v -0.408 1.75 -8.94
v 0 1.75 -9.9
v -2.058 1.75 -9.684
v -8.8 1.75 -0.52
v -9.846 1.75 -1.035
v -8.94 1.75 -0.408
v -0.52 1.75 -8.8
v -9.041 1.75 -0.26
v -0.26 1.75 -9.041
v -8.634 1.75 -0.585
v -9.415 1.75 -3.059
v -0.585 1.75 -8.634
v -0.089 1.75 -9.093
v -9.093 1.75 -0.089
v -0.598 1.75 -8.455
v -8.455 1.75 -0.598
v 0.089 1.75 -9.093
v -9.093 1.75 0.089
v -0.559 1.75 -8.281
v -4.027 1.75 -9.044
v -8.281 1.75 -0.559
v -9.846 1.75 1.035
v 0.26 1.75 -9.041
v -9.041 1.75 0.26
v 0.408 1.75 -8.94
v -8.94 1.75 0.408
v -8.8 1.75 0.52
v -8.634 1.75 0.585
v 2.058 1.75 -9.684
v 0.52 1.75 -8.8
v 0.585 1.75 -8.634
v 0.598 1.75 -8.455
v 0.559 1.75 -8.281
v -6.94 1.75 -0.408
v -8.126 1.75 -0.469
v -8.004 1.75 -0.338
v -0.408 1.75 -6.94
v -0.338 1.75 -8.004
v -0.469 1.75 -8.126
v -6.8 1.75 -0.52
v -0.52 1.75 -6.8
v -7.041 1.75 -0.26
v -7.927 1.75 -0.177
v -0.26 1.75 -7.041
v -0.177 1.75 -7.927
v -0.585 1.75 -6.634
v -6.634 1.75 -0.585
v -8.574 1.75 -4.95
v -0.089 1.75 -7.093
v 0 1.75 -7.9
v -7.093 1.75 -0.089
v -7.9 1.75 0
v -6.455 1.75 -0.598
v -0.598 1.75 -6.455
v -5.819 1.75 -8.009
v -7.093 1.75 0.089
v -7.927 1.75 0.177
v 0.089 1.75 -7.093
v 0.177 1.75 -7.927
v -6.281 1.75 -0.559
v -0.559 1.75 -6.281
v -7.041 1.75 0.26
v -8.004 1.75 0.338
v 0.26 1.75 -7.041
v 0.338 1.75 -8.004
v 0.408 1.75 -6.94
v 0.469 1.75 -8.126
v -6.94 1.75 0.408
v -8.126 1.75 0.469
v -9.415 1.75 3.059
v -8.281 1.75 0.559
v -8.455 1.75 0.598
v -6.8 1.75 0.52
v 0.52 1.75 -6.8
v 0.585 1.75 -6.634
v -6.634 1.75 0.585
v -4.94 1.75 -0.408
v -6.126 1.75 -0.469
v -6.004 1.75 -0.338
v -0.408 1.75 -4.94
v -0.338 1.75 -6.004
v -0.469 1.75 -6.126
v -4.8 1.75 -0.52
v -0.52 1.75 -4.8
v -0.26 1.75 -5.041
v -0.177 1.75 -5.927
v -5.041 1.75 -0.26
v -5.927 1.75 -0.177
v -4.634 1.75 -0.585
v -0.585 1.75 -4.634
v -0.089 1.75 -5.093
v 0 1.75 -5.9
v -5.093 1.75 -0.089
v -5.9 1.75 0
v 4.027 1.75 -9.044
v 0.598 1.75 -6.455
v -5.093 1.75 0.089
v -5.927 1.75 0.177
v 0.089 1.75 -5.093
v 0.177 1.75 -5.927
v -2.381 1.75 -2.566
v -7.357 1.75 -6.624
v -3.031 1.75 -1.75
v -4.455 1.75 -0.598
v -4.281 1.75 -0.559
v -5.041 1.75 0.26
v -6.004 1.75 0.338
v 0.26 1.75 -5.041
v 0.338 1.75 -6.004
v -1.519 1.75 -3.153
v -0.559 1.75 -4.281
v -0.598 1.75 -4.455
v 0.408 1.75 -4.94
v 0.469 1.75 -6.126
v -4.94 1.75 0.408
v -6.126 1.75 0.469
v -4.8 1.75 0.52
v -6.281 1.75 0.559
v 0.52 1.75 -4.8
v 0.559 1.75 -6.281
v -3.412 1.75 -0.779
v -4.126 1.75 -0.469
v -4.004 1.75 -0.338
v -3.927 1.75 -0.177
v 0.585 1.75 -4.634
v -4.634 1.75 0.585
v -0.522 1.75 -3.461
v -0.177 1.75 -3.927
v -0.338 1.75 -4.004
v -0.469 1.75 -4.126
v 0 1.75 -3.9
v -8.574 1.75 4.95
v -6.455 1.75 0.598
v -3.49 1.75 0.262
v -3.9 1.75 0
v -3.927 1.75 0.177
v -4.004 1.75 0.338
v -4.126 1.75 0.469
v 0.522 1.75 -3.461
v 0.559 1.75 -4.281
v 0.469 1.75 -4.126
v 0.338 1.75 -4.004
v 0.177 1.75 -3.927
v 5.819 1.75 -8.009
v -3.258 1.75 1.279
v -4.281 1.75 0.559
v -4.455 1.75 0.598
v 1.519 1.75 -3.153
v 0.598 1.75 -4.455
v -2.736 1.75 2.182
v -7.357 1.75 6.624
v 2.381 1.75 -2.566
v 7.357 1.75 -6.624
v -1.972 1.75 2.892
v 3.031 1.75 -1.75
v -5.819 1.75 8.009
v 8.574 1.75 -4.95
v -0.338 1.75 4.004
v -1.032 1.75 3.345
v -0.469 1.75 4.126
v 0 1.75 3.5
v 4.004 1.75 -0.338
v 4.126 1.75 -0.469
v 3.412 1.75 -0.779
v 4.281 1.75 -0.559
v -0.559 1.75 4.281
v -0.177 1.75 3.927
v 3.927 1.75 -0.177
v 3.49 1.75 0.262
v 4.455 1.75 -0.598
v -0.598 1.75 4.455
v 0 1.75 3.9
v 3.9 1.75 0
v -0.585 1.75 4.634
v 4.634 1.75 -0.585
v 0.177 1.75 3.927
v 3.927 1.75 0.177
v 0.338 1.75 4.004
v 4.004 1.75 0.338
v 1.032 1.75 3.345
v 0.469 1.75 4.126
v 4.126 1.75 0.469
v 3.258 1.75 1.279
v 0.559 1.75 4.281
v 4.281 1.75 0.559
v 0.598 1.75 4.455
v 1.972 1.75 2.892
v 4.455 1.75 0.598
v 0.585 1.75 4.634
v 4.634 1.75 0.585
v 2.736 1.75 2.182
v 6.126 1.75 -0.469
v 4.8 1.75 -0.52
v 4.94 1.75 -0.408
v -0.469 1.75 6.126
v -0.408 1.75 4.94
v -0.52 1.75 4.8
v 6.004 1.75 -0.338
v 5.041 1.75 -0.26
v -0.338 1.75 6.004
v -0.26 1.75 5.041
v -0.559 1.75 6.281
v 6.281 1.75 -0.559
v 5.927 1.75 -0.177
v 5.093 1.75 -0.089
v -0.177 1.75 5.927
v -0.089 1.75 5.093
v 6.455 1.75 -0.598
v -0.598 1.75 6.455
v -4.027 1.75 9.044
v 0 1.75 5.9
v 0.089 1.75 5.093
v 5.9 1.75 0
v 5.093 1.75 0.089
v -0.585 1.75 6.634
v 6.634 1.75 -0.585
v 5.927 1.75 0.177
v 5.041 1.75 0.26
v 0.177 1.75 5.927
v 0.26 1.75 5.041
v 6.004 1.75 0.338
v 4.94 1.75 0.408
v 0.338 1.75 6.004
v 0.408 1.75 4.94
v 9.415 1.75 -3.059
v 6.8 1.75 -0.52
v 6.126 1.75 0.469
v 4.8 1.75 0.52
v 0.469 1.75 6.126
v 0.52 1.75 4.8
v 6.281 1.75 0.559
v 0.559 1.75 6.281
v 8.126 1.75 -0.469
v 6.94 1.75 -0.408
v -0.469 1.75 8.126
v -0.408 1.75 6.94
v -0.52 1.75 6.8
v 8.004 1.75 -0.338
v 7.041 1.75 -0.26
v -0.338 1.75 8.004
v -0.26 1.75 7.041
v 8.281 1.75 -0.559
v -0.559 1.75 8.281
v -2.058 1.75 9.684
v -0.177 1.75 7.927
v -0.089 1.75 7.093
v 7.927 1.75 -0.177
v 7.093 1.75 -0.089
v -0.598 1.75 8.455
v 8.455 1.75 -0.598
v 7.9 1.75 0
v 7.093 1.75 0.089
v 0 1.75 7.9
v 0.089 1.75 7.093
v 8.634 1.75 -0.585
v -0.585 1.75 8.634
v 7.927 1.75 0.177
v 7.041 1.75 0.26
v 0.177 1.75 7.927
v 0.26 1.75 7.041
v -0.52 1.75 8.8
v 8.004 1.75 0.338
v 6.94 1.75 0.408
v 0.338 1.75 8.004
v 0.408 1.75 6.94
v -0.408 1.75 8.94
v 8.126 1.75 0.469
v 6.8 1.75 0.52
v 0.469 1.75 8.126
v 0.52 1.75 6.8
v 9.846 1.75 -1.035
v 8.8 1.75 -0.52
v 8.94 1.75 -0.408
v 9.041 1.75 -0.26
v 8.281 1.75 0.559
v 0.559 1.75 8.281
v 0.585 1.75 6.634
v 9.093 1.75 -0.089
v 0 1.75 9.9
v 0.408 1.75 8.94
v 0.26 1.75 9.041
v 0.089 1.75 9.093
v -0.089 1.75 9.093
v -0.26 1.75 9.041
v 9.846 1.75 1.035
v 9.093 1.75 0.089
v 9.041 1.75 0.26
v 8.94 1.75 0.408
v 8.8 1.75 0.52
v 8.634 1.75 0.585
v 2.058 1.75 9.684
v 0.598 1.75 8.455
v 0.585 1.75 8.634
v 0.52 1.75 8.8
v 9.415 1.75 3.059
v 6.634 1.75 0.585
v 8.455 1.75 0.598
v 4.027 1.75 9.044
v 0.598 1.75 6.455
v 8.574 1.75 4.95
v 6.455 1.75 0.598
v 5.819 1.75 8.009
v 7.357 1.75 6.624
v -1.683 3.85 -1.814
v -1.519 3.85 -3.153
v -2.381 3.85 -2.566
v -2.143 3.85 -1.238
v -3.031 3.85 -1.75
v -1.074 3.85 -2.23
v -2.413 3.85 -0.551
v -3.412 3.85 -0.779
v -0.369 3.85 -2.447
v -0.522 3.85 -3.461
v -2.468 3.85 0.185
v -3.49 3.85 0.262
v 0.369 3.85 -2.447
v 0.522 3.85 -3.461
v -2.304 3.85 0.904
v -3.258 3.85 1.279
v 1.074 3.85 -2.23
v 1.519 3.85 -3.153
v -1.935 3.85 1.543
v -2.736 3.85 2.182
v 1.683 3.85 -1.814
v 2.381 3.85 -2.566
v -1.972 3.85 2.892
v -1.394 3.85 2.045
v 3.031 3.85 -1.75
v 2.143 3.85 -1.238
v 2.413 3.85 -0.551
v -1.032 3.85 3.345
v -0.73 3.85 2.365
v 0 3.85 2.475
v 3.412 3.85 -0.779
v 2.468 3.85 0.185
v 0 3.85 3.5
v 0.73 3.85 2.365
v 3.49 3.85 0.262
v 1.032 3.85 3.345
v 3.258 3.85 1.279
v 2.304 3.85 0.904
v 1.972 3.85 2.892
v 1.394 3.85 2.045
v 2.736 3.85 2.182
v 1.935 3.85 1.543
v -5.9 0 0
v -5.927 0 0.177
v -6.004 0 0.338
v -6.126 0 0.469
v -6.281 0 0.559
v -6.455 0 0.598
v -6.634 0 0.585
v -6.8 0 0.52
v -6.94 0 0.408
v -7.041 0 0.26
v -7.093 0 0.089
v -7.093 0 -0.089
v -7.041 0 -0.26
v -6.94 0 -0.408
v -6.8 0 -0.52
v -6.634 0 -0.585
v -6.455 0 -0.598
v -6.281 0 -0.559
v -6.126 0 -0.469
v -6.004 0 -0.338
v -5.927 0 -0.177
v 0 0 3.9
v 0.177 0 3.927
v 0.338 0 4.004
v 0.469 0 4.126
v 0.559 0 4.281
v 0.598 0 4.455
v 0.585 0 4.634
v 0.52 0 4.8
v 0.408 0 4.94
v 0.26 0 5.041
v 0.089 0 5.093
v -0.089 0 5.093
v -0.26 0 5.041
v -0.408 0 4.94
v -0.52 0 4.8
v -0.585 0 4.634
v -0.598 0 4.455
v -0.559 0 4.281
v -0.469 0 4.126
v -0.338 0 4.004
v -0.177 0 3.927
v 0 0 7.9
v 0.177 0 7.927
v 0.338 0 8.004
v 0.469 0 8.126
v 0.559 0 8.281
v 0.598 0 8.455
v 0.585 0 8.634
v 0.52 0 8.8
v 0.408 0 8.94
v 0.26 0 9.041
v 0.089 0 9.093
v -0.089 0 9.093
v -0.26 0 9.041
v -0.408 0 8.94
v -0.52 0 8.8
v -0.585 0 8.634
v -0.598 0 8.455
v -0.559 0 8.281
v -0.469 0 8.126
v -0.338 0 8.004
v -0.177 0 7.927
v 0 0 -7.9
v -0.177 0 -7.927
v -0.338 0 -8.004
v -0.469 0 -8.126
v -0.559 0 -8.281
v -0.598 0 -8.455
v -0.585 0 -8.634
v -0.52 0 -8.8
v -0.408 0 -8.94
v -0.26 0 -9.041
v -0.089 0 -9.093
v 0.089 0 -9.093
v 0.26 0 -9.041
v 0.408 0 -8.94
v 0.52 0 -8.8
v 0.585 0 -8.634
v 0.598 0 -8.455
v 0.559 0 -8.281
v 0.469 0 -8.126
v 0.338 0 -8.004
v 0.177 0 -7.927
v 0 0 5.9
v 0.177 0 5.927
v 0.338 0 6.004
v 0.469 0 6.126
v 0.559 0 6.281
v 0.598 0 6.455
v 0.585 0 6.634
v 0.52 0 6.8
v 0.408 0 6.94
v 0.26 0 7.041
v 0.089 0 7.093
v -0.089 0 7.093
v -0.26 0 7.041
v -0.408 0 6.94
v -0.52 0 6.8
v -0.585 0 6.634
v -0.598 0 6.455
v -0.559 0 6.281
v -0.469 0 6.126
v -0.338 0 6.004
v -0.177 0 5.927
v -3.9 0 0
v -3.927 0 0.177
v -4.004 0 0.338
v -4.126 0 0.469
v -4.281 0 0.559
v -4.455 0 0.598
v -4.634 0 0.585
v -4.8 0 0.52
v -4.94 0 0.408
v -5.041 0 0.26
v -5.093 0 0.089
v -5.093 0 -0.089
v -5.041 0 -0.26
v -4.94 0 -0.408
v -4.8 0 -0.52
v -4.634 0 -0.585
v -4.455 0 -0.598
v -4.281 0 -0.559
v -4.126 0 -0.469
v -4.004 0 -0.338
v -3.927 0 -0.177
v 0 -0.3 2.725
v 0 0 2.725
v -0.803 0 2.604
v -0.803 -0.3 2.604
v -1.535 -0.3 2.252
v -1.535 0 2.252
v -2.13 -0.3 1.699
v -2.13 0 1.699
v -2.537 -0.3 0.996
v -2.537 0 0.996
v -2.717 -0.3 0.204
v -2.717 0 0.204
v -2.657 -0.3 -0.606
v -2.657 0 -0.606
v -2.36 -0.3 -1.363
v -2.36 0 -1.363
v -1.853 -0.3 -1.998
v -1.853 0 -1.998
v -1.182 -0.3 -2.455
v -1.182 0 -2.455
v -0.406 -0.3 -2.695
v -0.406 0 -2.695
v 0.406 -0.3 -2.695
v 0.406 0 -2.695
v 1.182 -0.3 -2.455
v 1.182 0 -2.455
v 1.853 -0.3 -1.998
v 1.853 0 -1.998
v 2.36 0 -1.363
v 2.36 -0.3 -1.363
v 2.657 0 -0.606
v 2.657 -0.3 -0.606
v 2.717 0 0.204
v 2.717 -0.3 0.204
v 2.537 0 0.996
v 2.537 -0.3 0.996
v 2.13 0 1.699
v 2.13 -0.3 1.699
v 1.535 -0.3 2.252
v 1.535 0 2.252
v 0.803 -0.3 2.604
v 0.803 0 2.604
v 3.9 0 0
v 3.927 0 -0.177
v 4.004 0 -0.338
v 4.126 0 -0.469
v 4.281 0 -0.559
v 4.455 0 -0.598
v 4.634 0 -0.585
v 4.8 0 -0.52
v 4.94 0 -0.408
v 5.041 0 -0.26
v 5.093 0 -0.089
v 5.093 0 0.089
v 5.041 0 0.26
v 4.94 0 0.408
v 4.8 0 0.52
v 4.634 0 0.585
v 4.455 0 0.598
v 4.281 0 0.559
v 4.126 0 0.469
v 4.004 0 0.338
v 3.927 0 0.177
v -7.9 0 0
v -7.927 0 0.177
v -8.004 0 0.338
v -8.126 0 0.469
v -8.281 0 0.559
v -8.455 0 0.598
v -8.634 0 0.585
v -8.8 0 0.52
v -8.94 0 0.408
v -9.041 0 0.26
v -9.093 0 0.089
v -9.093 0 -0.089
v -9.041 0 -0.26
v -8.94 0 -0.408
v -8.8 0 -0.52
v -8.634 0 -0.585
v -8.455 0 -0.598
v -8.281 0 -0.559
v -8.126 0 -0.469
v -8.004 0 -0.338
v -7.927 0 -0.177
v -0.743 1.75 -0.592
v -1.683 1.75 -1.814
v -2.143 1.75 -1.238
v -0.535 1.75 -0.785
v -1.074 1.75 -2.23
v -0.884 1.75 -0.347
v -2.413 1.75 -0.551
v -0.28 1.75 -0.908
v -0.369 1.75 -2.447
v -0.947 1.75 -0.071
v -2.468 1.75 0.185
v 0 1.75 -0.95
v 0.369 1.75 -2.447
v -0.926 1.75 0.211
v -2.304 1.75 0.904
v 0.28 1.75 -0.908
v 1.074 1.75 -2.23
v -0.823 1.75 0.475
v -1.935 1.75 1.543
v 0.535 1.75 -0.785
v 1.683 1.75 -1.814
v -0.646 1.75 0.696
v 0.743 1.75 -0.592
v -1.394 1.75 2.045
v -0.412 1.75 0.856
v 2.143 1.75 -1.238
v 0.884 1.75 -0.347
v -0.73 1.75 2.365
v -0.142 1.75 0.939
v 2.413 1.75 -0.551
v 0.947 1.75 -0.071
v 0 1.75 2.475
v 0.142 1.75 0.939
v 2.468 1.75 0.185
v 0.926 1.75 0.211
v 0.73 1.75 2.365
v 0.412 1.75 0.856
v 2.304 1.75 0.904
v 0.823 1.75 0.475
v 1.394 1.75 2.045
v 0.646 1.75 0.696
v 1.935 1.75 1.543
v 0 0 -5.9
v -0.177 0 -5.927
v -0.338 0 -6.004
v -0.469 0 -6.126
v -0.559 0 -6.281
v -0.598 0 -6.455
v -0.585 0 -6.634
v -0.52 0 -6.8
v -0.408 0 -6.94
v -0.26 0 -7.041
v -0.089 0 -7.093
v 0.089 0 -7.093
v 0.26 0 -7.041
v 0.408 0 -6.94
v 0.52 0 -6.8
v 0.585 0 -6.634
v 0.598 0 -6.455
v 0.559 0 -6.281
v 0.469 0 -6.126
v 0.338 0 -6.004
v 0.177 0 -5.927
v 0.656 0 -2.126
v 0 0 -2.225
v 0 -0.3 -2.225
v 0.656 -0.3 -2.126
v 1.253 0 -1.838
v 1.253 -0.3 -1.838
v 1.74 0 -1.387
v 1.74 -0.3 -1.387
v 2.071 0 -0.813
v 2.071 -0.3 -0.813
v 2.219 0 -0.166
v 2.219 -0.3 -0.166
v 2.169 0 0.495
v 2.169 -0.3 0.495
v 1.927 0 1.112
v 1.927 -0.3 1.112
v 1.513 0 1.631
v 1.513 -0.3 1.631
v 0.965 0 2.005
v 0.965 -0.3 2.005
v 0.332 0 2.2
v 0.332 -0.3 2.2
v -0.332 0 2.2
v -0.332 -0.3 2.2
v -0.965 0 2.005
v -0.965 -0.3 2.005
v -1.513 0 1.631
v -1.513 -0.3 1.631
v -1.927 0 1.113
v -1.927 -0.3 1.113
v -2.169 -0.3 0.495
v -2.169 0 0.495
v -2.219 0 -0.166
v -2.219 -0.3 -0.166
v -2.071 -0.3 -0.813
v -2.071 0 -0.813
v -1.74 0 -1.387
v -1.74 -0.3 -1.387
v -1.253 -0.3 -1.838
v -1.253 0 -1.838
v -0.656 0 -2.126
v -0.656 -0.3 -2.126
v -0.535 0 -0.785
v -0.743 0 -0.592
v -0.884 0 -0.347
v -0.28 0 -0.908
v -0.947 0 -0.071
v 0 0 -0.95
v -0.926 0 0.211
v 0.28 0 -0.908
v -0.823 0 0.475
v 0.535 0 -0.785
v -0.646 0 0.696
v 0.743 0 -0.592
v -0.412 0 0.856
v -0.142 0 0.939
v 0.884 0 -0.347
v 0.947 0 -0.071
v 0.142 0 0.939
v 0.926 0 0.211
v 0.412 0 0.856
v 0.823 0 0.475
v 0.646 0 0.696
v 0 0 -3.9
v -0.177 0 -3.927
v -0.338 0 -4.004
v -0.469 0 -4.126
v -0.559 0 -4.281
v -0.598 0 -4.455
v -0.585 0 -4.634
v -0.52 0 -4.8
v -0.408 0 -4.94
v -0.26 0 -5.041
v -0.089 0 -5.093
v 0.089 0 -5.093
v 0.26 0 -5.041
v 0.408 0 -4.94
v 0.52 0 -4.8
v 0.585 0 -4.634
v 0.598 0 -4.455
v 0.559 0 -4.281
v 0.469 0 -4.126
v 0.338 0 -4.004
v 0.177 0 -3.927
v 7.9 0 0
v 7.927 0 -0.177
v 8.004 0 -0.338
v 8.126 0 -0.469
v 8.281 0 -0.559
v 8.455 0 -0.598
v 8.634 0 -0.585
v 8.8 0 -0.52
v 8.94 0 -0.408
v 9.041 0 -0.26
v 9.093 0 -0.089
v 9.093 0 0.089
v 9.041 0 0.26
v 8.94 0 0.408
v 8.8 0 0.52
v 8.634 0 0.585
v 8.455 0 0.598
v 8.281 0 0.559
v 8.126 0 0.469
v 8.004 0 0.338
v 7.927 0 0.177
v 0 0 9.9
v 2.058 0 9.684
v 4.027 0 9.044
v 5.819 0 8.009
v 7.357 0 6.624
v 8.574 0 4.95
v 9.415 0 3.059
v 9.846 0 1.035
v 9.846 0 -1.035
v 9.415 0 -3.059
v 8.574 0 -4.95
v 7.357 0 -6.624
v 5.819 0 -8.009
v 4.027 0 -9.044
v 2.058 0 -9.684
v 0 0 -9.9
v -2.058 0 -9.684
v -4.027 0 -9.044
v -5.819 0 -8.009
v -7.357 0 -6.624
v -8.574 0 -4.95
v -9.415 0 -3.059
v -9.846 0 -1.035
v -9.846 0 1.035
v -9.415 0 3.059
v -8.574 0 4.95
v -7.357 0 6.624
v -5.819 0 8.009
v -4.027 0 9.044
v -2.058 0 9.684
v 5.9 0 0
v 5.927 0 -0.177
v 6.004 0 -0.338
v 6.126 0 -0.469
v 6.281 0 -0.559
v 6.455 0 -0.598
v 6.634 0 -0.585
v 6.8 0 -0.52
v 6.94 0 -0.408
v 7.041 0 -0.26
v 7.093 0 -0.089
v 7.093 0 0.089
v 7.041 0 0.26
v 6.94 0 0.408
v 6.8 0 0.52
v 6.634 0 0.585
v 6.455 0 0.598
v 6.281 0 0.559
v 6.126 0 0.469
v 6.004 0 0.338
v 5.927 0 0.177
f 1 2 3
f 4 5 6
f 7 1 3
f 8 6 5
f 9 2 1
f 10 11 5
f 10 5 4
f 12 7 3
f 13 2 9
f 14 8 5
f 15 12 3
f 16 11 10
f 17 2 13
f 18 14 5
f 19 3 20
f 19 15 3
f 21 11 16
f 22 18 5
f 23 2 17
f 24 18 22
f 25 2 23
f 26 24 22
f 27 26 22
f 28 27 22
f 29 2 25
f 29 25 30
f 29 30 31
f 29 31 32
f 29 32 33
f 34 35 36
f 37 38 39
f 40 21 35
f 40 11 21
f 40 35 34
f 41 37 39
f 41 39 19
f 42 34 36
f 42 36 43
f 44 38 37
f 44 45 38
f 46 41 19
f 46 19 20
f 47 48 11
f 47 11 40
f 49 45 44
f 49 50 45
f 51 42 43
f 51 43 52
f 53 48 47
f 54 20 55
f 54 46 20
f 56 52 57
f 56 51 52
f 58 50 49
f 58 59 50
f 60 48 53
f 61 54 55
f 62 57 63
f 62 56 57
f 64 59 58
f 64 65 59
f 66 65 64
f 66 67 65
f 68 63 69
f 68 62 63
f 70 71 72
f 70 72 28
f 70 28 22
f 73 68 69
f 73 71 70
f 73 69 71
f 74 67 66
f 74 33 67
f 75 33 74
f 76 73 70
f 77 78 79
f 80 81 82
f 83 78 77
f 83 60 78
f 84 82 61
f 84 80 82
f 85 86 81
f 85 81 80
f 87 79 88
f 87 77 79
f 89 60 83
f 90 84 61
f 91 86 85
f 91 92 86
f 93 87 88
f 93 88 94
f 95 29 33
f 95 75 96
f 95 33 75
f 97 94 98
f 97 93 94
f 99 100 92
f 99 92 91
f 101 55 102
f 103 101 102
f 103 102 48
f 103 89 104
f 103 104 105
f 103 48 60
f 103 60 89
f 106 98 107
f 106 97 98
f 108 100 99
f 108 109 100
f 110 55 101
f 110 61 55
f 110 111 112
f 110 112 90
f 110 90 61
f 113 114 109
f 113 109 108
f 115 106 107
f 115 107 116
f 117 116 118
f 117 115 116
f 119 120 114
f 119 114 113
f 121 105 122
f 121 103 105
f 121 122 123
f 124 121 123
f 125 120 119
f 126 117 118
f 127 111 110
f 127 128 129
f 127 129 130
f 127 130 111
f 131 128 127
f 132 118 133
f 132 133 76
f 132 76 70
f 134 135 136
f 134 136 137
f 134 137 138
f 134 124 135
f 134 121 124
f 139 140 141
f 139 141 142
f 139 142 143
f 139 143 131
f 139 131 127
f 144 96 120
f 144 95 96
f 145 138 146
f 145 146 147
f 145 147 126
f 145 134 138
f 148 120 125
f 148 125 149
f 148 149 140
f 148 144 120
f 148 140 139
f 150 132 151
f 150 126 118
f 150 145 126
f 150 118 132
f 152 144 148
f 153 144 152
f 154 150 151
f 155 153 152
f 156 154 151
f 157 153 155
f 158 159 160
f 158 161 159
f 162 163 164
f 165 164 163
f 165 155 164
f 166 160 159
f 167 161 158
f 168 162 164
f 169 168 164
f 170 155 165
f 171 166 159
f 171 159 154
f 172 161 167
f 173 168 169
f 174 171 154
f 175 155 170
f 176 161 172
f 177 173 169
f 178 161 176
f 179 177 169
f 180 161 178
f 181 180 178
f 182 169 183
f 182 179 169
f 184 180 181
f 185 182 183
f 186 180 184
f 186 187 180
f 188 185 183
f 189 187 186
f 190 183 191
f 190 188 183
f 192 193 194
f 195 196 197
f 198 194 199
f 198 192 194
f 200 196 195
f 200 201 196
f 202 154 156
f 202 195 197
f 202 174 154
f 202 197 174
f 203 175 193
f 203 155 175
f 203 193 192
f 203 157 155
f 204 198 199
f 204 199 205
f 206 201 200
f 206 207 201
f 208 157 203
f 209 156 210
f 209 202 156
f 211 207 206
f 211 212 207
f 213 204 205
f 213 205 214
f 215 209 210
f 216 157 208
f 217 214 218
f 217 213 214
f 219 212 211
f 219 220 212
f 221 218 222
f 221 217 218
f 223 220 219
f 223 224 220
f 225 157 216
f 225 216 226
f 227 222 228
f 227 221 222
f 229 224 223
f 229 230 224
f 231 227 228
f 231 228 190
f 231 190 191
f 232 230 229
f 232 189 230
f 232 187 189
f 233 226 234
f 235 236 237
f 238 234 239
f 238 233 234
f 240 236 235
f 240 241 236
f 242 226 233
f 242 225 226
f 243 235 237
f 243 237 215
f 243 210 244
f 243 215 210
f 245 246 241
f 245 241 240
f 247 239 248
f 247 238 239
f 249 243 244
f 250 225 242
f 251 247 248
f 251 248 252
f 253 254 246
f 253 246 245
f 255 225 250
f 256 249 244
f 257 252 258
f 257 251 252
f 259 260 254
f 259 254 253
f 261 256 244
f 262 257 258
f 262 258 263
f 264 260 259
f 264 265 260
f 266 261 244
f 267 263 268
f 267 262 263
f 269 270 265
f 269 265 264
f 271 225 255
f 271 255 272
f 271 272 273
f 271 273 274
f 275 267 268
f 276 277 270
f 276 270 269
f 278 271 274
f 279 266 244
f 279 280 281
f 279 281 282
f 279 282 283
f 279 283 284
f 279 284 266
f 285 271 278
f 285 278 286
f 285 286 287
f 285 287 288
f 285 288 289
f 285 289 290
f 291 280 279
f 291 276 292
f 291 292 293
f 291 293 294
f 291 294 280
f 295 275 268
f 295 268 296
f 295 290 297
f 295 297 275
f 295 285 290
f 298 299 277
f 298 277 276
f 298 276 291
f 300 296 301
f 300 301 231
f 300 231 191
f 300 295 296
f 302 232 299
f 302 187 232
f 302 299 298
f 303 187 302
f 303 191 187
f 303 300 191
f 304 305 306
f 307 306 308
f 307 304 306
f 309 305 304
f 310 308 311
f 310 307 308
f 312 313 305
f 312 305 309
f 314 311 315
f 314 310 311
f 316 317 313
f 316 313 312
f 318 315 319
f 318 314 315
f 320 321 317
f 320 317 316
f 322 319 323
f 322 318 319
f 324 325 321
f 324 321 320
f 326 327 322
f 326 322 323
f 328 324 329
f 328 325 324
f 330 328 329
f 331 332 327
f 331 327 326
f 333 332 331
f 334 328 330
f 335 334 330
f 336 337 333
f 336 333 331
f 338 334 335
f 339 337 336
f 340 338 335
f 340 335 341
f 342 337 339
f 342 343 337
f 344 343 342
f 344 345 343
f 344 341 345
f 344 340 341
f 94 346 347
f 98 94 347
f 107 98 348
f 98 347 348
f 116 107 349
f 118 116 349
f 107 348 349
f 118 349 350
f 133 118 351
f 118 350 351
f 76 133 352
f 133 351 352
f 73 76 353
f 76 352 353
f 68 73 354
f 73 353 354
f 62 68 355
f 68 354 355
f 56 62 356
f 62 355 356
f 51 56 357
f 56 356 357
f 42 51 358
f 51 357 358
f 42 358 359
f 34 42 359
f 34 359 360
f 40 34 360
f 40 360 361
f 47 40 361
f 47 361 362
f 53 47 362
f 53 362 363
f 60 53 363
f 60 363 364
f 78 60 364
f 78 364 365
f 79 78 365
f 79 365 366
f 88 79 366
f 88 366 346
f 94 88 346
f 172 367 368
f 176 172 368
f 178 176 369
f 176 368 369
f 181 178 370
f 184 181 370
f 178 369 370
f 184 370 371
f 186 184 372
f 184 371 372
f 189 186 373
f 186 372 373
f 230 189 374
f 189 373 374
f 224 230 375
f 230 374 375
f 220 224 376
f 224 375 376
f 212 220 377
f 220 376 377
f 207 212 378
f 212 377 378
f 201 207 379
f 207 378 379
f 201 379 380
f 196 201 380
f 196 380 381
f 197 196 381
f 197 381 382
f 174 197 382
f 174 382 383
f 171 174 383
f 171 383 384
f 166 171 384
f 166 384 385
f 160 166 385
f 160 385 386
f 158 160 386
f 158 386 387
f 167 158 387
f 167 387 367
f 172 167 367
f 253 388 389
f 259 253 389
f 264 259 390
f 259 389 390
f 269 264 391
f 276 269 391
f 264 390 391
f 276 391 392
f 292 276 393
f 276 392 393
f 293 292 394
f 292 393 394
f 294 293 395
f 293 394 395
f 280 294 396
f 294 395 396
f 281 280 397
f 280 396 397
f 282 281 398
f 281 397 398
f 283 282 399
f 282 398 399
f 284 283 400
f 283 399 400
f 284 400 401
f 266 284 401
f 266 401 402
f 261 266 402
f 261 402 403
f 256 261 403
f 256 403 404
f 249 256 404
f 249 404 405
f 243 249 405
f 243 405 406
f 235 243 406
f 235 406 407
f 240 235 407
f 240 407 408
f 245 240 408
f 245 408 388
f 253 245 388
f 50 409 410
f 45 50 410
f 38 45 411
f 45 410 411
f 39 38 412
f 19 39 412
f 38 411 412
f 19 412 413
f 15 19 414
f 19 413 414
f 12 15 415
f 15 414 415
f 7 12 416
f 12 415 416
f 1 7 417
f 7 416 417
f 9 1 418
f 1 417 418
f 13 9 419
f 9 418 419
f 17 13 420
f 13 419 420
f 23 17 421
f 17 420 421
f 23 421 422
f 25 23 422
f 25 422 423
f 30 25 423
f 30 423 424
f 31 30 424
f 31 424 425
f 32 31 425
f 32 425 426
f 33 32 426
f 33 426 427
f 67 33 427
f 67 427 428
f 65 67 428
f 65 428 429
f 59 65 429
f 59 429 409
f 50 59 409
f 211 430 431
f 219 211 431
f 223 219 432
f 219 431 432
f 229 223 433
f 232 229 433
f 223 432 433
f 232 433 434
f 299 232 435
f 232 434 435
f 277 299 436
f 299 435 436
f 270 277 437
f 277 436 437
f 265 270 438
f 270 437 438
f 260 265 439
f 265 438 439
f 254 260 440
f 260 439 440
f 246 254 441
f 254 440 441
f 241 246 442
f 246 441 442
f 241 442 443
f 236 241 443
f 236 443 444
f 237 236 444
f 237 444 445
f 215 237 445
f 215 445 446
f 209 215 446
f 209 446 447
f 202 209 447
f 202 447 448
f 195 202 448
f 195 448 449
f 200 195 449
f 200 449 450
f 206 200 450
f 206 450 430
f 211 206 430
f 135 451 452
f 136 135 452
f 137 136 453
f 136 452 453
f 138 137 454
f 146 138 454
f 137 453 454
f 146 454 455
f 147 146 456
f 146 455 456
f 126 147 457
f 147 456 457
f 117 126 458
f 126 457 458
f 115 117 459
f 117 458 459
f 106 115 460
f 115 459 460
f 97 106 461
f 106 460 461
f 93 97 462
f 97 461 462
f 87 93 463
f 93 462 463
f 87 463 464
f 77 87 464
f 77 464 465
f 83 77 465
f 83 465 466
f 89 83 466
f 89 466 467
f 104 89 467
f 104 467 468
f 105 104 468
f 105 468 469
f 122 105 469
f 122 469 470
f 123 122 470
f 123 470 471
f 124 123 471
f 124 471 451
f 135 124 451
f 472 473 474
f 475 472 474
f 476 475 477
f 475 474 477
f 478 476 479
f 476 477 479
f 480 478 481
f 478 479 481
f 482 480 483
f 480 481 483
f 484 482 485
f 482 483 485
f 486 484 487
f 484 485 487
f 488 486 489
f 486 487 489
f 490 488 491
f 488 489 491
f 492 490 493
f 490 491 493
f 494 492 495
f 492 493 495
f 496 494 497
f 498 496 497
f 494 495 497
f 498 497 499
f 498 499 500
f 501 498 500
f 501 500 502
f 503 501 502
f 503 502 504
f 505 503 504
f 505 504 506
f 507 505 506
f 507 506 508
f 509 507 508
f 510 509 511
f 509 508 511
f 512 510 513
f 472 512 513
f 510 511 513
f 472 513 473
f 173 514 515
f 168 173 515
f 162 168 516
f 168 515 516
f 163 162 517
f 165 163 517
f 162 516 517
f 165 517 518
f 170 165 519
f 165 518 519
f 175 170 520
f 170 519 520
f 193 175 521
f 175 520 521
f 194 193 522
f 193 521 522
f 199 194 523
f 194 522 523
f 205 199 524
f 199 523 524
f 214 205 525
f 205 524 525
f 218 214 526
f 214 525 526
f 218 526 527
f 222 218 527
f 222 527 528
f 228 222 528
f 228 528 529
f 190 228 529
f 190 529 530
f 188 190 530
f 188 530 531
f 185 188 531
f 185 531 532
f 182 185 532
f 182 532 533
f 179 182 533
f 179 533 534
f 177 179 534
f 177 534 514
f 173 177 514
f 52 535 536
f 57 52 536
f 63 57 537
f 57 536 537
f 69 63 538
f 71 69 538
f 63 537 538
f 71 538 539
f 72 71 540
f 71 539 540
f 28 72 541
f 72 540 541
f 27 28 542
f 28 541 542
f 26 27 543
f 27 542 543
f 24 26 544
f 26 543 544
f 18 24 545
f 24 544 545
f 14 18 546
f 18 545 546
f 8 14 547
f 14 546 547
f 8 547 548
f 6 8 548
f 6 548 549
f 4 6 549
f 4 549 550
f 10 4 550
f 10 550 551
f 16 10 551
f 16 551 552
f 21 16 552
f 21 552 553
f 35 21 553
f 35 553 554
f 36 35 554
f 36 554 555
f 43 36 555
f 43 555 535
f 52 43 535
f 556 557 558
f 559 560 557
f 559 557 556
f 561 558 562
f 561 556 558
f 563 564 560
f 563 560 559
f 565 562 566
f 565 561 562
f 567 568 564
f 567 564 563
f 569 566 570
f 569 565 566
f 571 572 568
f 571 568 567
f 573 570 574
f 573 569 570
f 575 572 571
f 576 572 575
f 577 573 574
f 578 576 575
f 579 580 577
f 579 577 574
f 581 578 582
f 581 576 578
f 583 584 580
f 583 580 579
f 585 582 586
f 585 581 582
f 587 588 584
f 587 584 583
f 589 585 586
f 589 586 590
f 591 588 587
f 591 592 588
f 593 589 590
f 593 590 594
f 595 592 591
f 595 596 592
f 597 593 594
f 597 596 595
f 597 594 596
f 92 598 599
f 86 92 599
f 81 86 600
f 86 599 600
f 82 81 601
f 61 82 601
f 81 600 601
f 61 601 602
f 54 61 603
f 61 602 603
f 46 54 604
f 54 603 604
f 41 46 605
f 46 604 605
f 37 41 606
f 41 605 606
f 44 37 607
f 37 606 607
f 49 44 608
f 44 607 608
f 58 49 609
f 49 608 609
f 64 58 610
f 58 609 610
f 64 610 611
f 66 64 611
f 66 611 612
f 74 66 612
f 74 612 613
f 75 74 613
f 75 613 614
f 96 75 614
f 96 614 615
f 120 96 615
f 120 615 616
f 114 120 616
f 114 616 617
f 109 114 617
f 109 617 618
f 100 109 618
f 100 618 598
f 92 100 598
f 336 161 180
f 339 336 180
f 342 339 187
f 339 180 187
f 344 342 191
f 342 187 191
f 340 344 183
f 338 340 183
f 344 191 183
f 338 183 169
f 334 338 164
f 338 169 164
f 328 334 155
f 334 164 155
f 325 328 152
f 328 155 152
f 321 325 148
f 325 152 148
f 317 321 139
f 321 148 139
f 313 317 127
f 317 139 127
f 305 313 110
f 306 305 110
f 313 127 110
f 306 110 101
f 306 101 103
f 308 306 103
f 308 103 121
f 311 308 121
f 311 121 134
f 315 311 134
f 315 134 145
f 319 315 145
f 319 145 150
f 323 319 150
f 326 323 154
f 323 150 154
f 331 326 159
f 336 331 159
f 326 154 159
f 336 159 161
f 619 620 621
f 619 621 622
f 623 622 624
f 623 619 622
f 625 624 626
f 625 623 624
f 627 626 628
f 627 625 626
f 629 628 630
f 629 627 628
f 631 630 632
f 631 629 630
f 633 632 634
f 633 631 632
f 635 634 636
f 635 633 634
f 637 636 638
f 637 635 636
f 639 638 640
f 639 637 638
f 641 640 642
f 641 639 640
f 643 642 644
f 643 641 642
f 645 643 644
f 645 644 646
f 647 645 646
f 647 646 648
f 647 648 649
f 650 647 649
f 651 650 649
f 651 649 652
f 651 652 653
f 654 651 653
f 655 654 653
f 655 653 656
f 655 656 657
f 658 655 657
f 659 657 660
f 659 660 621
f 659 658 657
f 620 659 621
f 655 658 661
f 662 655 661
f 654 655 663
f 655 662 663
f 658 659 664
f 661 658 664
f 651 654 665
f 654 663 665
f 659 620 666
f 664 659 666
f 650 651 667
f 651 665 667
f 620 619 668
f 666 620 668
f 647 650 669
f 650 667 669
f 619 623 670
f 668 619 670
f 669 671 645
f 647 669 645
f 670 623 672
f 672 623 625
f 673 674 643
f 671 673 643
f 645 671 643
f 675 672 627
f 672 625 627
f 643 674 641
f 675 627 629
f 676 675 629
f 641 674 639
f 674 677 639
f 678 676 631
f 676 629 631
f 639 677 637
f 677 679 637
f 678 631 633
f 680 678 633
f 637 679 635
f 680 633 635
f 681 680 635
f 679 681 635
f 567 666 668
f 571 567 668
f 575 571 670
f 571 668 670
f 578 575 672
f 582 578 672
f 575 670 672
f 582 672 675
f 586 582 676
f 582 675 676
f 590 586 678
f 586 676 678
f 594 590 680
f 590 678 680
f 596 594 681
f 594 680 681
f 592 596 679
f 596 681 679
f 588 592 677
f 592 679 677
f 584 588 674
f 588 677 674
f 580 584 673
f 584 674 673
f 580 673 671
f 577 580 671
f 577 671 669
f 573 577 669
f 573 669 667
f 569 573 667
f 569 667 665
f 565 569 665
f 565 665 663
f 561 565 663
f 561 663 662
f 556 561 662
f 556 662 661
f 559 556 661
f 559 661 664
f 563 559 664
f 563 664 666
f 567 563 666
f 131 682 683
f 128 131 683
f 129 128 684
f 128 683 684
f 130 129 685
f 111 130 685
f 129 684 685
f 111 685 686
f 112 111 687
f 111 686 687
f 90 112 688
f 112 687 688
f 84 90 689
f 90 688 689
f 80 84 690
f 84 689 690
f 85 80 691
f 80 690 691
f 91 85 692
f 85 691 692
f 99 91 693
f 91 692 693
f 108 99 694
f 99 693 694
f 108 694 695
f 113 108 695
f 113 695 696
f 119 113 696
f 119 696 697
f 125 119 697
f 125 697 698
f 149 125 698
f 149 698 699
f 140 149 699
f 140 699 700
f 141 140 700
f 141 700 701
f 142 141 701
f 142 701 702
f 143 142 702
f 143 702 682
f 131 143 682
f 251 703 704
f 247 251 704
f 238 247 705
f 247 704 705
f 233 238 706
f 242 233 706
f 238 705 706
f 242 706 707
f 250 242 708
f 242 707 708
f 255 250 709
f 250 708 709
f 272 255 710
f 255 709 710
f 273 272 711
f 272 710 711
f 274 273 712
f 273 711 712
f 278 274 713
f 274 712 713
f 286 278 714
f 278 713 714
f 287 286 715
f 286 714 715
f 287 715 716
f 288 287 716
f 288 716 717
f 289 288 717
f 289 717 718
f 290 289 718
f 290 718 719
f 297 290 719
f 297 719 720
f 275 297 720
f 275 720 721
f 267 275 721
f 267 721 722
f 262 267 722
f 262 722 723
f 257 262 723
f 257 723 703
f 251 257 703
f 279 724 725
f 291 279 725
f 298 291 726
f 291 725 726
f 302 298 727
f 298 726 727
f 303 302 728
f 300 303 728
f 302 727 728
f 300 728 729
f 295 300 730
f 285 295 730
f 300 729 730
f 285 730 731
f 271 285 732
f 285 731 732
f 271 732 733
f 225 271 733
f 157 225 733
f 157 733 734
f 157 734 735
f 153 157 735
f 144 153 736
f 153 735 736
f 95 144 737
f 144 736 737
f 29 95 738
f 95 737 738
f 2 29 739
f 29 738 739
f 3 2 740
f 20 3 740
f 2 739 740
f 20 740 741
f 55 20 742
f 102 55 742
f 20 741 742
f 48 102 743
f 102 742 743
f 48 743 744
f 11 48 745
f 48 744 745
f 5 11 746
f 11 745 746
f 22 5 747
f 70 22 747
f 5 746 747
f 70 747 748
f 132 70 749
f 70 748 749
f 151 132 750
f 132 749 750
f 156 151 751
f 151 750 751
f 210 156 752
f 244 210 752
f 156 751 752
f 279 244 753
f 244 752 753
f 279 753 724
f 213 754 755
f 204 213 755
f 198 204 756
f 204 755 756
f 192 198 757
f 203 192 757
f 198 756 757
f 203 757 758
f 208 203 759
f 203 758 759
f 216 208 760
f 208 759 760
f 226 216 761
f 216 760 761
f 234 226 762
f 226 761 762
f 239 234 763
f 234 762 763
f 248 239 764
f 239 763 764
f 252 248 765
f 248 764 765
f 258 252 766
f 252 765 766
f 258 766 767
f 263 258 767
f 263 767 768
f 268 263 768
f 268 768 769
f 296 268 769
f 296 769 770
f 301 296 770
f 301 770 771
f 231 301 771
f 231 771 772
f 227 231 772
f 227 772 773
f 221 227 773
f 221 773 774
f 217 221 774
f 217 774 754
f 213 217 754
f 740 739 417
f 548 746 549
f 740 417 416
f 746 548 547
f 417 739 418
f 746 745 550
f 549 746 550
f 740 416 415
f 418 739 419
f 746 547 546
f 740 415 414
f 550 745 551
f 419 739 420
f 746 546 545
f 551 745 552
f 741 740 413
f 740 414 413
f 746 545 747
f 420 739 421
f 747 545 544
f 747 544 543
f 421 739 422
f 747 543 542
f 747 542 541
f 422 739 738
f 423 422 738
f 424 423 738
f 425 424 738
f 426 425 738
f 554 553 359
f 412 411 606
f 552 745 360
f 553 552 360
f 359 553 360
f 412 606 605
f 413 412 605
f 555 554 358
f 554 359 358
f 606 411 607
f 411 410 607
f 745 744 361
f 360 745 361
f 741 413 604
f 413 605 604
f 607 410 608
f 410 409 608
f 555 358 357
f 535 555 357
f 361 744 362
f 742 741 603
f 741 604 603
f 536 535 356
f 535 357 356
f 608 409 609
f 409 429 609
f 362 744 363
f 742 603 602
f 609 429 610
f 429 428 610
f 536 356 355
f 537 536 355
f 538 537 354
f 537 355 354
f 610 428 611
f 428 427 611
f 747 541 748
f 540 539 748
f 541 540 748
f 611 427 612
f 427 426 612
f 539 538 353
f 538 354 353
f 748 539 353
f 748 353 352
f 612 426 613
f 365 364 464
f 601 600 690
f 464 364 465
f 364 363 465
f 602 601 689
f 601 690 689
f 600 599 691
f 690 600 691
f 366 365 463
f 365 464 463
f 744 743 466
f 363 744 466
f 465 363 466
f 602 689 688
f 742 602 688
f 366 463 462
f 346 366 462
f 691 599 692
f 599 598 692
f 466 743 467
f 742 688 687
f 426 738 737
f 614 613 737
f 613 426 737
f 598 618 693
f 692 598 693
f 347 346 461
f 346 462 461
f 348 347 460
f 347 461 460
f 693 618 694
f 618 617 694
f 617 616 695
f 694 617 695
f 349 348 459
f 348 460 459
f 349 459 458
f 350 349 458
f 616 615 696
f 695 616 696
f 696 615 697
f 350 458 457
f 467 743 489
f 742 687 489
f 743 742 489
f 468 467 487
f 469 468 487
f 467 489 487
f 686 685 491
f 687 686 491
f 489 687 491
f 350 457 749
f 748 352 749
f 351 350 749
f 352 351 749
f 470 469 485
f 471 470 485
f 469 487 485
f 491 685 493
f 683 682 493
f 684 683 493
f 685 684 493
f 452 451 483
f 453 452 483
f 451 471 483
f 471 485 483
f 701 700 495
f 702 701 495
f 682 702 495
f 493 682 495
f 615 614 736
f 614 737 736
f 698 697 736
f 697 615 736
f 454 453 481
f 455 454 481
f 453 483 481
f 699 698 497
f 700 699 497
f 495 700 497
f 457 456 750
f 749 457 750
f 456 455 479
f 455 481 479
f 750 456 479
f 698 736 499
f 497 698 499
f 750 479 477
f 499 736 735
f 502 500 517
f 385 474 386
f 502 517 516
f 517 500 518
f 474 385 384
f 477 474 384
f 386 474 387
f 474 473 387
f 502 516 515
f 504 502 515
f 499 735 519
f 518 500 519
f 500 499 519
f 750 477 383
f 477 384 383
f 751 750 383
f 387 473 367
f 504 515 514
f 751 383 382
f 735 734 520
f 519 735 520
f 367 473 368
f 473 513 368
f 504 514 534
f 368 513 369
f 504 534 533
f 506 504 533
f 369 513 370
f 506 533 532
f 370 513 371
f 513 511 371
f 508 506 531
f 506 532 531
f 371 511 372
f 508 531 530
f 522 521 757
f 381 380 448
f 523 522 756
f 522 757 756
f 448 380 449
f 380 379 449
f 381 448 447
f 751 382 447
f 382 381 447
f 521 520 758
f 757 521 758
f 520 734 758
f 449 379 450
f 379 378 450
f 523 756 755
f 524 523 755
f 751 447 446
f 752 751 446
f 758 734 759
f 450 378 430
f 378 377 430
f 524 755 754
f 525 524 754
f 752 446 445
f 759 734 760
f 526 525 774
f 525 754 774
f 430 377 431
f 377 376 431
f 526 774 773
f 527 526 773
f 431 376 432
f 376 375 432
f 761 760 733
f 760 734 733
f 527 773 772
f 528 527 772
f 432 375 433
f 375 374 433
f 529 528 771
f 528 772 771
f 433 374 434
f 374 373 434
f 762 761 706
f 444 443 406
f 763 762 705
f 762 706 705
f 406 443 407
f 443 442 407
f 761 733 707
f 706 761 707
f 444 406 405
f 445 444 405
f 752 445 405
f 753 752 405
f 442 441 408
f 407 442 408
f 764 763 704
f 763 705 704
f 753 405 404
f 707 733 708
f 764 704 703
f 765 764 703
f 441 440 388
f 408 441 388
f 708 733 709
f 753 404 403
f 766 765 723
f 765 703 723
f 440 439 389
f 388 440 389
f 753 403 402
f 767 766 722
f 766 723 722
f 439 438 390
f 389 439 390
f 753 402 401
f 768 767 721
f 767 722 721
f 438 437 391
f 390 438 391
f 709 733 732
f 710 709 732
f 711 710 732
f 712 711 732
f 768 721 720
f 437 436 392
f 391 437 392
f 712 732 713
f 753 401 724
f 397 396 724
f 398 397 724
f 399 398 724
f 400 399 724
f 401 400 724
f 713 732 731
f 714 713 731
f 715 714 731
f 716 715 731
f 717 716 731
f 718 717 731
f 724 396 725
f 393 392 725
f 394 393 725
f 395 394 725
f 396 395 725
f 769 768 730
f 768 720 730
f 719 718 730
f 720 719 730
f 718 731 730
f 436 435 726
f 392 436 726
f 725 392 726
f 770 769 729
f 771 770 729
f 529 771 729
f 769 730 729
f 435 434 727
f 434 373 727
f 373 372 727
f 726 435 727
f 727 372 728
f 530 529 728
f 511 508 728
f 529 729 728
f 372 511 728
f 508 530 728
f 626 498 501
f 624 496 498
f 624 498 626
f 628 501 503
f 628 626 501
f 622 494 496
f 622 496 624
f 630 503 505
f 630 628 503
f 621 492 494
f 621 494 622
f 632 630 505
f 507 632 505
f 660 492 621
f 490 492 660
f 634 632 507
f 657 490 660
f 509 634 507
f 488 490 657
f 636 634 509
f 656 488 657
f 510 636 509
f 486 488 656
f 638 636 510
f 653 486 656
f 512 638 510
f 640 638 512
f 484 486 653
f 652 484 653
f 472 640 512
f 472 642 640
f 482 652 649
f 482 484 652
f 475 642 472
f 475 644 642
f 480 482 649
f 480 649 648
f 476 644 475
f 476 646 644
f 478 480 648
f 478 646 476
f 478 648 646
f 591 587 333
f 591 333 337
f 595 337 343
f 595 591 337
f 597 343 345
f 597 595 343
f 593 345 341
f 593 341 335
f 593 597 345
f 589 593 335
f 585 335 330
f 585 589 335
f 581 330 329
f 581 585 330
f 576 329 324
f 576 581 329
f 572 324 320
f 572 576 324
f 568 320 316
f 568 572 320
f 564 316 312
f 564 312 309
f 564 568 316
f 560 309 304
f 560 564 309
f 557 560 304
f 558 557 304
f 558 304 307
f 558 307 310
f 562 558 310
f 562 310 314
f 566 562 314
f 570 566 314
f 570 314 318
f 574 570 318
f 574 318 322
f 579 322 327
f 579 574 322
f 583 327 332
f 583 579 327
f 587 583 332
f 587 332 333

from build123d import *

# Parameters (mm, degrees)
ESQUISSE1_R                  = 9.9
BOSS_EXTRU_1_DEPTH           = 1.75
ESQUISSE2_R                  = 3.5
ESQUISSE2_R_2                = 2.475
BOSS_EXTRU_2_DEPTH           = 2.1
ESQUISSE3_R                  = 2.725
ESQUISSE3_R_2                = 2.225
BOSS_EXTRU_3_DEPTH           = 0.3
ESQUISSE4_R                  = 0.95
ENL_V_MAT_EXTRU_1_DEPTH      = 15.520416661
ESQUISSE5_R                  = 0.6
ENL_V_MAT_EXTRU_2_DEPTH      = 15.520416661
R_P_TITION_CIRCULAIRE1_COUNT = 4


with BuildPart() as part:
    # Esquisse1 → Boss.-Extru.1 (new body)
    with BuildSketch(Plane(origin=(0, 0, 0), x_dir=(1, 0, 0), z_dir=(0, 1, 0))):
        with Locations(Location((0, 0, 0), (0, 0, 270))):
            Circle(ESQUISSE1_R)
    extrude(amount=BOSS_EXTRU_1_DEPTH)

    # Esquisse2 → Boss.-Extru.2 (add)
    with BuildSketch(Plane(origin=(0, 1.75, 0), x_dir=(1, 0, 0), z_dir=(0, 1, 0))):
        with Locations(Location((0, 0, 0), (0, 0, 270))):
            Circle(ESQUISSE2_R)
        with Locations(Location((0, 0, 0), (0, 0, 270))):
            Circle(ESQUISSE2_R_2, mode=Mode.SUBTRACT)
    extrude(amount=BOSS_EXTRU_2_DEPTH)

    # Esquisse3 → Boss.-Extru.3 (add)
    with BuildSketch(Plane.XZ):
        with Locations(Location((0, 0, 0), (0, 0, 90))):
            Circle(ESQUISSE3_R)
        with Locations(Location((0, 0, 0), (0, 0, 270))):
            Circle(ESQUISSE3_R_2, mode=Mode.SUBTRACT)
    extrude(amount=BOSS_EXTRU_3_DEPTH)

    # Esquisse4 → Enlèv. mat.-Extru.1 (cut, through all)
    with BuildSketch(Plane.XZ):
        with Locations(Location((0, 0, 0), (0, 0, 270))):
            Circle(ESQUISSE4_R)
    extrude(amount=-ENL_V_MAT_EXTRU_1_DEPTH, mode=Mode.SUBTRACT)

    # Esquisse5 → Enlèv. mat.-Extru.2 (cut, through all)
    with BuildSketch(Plane.XZ):
        with Locations(Location((0, 4.5, 0), (0, 0, 270))):
            Circle(ESQUISSE5_R)
        with Locations(Location((0, 6.5, 0), (0, 0, 270))):
            Circle(ESQUISSE5_R)
        with Locations(Location((0, 8.5, 0), (0, 0, 270))):
            Circle(ESQUISSE5_R)
    enl_v_mat_extru_2 = extrude(amount=-ENL_V_MAT_EXTRU_2_DEPTH, mode=Mode.SUBTRACT)

    # Répétition circulaire1: Enlèv. mat.-Extru.2 ×4 about axis
    r_p_tition_circulaire1_axis = Axis((0, 0, 0), (0, 1, 0))
    for i in range(1, R_P_TITION_CIRCULAIRE1_COUNT):
        add(enl_v_mat_extru_2.rotate(r_p_tition_circulaire1_axis, i * 360 / R_P_TITION_CIRCULAIRE1_COUNT), mode=Mode.SUBTRACT)


solid = part.part
